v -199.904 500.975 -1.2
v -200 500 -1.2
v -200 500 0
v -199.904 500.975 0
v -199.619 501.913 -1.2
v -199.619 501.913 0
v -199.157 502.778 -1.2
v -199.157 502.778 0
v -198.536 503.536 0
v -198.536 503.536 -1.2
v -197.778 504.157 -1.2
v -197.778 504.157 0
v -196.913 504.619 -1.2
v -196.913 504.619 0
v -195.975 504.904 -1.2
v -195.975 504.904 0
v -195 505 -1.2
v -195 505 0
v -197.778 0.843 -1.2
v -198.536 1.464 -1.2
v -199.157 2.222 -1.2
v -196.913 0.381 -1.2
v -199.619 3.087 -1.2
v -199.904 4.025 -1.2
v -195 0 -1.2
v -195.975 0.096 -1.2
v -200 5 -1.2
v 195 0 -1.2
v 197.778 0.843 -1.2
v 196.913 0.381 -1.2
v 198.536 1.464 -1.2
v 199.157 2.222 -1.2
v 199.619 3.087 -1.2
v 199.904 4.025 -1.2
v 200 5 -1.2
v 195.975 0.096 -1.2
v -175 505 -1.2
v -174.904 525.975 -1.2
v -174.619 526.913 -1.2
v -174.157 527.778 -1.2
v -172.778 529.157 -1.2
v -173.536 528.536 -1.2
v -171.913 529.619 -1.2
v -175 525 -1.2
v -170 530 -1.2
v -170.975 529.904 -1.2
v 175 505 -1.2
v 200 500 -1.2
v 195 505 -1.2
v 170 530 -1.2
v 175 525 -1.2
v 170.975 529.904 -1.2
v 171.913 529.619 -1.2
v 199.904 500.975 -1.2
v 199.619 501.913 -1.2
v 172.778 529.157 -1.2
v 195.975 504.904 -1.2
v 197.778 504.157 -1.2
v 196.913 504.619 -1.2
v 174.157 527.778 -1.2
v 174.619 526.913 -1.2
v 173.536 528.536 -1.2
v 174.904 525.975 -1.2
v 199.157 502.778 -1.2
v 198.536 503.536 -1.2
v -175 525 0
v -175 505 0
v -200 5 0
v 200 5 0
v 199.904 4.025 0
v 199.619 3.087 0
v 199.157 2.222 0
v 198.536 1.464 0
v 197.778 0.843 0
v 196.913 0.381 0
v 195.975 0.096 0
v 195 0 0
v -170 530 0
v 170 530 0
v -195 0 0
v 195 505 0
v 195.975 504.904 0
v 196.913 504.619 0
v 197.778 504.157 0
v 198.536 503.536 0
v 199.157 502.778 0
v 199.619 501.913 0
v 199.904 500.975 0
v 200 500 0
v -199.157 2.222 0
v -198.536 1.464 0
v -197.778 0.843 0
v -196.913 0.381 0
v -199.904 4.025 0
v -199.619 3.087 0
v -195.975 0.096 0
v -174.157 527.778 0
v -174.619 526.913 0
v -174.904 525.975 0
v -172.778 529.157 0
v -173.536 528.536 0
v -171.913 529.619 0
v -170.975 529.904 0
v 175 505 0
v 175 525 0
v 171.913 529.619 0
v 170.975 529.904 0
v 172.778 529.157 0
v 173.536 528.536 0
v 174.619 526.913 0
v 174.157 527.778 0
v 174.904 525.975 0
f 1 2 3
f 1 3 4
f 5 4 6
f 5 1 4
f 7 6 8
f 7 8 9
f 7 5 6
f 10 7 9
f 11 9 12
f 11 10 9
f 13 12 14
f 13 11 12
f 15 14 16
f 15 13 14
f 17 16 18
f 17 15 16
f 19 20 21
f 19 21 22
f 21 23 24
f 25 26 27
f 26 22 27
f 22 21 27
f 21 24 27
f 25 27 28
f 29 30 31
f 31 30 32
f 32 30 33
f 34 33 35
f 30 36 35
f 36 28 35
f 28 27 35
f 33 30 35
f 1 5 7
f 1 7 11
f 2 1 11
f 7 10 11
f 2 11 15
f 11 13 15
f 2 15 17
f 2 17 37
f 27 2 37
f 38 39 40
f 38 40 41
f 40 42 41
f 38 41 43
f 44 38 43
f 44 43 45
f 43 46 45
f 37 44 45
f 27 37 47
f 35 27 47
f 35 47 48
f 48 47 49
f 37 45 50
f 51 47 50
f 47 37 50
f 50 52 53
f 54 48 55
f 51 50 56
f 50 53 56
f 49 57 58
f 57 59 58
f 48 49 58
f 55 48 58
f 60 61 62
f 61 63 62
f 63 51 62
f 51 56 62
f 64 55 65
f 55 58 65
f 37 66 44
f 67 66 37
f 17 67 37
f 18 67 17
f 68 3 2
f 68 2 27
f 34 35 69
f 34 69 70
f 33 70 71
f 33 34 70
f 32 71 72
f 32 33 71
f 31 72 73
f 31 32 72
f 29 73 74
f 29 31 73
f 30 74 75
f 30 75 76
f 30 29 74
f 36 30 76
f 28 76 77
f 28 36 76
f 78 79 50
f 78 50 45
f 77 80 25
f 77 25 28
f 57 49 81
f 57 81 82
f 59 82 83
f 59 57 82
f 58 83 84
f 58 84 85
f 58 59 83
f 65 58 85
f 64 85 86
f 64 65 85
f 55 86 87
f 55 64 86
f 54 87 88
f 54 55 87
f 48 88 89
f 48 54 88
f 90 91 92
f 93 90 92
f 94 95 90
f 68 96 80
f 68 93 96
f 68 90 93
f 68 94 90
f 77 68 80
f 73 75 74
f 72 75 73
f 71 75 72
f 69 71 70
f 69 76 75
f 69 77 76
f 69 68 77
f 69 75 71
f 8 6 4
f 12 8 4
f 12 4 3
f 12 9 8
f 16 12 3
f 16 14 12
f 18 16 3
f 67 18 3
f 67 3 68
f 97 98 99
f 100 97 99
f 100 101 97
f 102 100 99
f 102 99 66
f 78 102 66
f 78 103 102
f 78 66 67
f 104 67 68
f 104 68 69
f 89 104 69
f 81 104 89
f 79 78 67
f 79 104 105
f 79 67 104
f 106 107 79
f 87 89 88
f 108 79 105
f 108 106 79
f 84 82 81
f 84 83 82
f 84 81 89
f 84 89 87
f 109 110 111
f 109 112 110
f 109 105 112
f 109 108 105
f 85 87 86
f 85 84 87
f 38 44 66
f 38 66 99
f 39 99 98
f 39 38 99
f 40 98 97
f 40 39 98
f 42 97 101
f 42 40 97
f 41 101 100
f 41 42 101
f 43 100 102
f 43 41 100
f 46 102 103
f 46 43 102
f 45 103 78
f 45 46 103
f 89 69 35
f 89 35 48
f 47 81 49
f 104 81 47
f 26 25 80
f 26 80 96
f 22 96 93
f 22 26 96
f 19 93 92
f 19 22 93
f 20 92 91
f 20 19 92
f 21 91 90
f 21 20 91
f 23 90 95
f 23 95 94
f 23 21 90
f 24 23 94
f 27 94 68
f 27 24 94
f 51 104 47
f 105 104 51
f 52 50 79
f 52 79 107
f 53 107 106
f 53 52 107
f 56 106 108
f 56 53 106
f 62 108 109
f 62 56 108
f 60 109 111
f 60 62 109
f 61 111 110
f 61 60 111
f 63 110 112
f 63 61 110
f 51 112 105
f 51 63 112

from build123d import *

# Parameters (mm, degrees)
TABAN_FLAN_1_DEPTH = 1.2
K_ELERI_START      = -1.2
K_ELERI_K_R1_DEPTH = 1.2


# Read off the part's stored shape, not the designer's step: Köşeleri kır1
# Sheet-metal steps are written as plain solids
with BuildPart() as part:
    # Çizim1 → Taban-Flanş1 (new body)
    with BuildSketch(Plane.XY):
        Polygon((-200, 0), (200, 0), (200, 505), (175, 505), (175, 530), (-175, 530), (-175, 505), (-200, 505), align=None)
    extrude(amount=-TABAN_FLAN_1_DEPTH)

    # Köşeleri kır1 outline → Köşeleri kır1 (cut)
    with BuildSketch(Plane.XY.offset(K_ELERI_START)):
        with BuildLine():
            ThreePointArc((200, 5), (198.535533906, 1.464466094), (195, 0))
            Line((195, 0), (200, 0))
            Line((200, 0), (200, 5))
        make_face()
        with BuildLine():
            Line((-200, 0), (-195, 0))
            ThreePointArc((-195, 0), (-198.535533906, 1.464466094), (-200, 5))
            Line((-200, 5), (-200, 0))
        make_face()
        with BuildLine():
            ThreePointArc((195, 505), (198.535533906, 503.535533906), (200, 500))
            Line((200, 500), (200, 505))
            Line((200, 505), (195, 505))
        make_face()
        with BuildLine():
            Line((-200, 505), (-200, 500))
            ThreePointArc((-200, 500), (-198.535533906, 503.535533906), (-195, 505))
            Line((-195, 505), (-200, 505))
        make_face()
        with BuildLine():
            ThreePointArc((170, 530), (173.535533906, 528.535533906), (175, 525))
            Line((175, 525), (175, 530))
            Line((175, 530), (170, 530))
        make_face()
        with BuildLine():
            Line((-175, 530), (-175, 525))
            ThreePointArc((-175, 525), (-173.535533906, 528.535533906), (-170, 530))
            Line((-170, 530), (-175, 530))
        make_face()
    extrude(amount=K_ELERI_K_R1_DEPTH, mode=Mode.SUBTRACT)


solid = part.part
